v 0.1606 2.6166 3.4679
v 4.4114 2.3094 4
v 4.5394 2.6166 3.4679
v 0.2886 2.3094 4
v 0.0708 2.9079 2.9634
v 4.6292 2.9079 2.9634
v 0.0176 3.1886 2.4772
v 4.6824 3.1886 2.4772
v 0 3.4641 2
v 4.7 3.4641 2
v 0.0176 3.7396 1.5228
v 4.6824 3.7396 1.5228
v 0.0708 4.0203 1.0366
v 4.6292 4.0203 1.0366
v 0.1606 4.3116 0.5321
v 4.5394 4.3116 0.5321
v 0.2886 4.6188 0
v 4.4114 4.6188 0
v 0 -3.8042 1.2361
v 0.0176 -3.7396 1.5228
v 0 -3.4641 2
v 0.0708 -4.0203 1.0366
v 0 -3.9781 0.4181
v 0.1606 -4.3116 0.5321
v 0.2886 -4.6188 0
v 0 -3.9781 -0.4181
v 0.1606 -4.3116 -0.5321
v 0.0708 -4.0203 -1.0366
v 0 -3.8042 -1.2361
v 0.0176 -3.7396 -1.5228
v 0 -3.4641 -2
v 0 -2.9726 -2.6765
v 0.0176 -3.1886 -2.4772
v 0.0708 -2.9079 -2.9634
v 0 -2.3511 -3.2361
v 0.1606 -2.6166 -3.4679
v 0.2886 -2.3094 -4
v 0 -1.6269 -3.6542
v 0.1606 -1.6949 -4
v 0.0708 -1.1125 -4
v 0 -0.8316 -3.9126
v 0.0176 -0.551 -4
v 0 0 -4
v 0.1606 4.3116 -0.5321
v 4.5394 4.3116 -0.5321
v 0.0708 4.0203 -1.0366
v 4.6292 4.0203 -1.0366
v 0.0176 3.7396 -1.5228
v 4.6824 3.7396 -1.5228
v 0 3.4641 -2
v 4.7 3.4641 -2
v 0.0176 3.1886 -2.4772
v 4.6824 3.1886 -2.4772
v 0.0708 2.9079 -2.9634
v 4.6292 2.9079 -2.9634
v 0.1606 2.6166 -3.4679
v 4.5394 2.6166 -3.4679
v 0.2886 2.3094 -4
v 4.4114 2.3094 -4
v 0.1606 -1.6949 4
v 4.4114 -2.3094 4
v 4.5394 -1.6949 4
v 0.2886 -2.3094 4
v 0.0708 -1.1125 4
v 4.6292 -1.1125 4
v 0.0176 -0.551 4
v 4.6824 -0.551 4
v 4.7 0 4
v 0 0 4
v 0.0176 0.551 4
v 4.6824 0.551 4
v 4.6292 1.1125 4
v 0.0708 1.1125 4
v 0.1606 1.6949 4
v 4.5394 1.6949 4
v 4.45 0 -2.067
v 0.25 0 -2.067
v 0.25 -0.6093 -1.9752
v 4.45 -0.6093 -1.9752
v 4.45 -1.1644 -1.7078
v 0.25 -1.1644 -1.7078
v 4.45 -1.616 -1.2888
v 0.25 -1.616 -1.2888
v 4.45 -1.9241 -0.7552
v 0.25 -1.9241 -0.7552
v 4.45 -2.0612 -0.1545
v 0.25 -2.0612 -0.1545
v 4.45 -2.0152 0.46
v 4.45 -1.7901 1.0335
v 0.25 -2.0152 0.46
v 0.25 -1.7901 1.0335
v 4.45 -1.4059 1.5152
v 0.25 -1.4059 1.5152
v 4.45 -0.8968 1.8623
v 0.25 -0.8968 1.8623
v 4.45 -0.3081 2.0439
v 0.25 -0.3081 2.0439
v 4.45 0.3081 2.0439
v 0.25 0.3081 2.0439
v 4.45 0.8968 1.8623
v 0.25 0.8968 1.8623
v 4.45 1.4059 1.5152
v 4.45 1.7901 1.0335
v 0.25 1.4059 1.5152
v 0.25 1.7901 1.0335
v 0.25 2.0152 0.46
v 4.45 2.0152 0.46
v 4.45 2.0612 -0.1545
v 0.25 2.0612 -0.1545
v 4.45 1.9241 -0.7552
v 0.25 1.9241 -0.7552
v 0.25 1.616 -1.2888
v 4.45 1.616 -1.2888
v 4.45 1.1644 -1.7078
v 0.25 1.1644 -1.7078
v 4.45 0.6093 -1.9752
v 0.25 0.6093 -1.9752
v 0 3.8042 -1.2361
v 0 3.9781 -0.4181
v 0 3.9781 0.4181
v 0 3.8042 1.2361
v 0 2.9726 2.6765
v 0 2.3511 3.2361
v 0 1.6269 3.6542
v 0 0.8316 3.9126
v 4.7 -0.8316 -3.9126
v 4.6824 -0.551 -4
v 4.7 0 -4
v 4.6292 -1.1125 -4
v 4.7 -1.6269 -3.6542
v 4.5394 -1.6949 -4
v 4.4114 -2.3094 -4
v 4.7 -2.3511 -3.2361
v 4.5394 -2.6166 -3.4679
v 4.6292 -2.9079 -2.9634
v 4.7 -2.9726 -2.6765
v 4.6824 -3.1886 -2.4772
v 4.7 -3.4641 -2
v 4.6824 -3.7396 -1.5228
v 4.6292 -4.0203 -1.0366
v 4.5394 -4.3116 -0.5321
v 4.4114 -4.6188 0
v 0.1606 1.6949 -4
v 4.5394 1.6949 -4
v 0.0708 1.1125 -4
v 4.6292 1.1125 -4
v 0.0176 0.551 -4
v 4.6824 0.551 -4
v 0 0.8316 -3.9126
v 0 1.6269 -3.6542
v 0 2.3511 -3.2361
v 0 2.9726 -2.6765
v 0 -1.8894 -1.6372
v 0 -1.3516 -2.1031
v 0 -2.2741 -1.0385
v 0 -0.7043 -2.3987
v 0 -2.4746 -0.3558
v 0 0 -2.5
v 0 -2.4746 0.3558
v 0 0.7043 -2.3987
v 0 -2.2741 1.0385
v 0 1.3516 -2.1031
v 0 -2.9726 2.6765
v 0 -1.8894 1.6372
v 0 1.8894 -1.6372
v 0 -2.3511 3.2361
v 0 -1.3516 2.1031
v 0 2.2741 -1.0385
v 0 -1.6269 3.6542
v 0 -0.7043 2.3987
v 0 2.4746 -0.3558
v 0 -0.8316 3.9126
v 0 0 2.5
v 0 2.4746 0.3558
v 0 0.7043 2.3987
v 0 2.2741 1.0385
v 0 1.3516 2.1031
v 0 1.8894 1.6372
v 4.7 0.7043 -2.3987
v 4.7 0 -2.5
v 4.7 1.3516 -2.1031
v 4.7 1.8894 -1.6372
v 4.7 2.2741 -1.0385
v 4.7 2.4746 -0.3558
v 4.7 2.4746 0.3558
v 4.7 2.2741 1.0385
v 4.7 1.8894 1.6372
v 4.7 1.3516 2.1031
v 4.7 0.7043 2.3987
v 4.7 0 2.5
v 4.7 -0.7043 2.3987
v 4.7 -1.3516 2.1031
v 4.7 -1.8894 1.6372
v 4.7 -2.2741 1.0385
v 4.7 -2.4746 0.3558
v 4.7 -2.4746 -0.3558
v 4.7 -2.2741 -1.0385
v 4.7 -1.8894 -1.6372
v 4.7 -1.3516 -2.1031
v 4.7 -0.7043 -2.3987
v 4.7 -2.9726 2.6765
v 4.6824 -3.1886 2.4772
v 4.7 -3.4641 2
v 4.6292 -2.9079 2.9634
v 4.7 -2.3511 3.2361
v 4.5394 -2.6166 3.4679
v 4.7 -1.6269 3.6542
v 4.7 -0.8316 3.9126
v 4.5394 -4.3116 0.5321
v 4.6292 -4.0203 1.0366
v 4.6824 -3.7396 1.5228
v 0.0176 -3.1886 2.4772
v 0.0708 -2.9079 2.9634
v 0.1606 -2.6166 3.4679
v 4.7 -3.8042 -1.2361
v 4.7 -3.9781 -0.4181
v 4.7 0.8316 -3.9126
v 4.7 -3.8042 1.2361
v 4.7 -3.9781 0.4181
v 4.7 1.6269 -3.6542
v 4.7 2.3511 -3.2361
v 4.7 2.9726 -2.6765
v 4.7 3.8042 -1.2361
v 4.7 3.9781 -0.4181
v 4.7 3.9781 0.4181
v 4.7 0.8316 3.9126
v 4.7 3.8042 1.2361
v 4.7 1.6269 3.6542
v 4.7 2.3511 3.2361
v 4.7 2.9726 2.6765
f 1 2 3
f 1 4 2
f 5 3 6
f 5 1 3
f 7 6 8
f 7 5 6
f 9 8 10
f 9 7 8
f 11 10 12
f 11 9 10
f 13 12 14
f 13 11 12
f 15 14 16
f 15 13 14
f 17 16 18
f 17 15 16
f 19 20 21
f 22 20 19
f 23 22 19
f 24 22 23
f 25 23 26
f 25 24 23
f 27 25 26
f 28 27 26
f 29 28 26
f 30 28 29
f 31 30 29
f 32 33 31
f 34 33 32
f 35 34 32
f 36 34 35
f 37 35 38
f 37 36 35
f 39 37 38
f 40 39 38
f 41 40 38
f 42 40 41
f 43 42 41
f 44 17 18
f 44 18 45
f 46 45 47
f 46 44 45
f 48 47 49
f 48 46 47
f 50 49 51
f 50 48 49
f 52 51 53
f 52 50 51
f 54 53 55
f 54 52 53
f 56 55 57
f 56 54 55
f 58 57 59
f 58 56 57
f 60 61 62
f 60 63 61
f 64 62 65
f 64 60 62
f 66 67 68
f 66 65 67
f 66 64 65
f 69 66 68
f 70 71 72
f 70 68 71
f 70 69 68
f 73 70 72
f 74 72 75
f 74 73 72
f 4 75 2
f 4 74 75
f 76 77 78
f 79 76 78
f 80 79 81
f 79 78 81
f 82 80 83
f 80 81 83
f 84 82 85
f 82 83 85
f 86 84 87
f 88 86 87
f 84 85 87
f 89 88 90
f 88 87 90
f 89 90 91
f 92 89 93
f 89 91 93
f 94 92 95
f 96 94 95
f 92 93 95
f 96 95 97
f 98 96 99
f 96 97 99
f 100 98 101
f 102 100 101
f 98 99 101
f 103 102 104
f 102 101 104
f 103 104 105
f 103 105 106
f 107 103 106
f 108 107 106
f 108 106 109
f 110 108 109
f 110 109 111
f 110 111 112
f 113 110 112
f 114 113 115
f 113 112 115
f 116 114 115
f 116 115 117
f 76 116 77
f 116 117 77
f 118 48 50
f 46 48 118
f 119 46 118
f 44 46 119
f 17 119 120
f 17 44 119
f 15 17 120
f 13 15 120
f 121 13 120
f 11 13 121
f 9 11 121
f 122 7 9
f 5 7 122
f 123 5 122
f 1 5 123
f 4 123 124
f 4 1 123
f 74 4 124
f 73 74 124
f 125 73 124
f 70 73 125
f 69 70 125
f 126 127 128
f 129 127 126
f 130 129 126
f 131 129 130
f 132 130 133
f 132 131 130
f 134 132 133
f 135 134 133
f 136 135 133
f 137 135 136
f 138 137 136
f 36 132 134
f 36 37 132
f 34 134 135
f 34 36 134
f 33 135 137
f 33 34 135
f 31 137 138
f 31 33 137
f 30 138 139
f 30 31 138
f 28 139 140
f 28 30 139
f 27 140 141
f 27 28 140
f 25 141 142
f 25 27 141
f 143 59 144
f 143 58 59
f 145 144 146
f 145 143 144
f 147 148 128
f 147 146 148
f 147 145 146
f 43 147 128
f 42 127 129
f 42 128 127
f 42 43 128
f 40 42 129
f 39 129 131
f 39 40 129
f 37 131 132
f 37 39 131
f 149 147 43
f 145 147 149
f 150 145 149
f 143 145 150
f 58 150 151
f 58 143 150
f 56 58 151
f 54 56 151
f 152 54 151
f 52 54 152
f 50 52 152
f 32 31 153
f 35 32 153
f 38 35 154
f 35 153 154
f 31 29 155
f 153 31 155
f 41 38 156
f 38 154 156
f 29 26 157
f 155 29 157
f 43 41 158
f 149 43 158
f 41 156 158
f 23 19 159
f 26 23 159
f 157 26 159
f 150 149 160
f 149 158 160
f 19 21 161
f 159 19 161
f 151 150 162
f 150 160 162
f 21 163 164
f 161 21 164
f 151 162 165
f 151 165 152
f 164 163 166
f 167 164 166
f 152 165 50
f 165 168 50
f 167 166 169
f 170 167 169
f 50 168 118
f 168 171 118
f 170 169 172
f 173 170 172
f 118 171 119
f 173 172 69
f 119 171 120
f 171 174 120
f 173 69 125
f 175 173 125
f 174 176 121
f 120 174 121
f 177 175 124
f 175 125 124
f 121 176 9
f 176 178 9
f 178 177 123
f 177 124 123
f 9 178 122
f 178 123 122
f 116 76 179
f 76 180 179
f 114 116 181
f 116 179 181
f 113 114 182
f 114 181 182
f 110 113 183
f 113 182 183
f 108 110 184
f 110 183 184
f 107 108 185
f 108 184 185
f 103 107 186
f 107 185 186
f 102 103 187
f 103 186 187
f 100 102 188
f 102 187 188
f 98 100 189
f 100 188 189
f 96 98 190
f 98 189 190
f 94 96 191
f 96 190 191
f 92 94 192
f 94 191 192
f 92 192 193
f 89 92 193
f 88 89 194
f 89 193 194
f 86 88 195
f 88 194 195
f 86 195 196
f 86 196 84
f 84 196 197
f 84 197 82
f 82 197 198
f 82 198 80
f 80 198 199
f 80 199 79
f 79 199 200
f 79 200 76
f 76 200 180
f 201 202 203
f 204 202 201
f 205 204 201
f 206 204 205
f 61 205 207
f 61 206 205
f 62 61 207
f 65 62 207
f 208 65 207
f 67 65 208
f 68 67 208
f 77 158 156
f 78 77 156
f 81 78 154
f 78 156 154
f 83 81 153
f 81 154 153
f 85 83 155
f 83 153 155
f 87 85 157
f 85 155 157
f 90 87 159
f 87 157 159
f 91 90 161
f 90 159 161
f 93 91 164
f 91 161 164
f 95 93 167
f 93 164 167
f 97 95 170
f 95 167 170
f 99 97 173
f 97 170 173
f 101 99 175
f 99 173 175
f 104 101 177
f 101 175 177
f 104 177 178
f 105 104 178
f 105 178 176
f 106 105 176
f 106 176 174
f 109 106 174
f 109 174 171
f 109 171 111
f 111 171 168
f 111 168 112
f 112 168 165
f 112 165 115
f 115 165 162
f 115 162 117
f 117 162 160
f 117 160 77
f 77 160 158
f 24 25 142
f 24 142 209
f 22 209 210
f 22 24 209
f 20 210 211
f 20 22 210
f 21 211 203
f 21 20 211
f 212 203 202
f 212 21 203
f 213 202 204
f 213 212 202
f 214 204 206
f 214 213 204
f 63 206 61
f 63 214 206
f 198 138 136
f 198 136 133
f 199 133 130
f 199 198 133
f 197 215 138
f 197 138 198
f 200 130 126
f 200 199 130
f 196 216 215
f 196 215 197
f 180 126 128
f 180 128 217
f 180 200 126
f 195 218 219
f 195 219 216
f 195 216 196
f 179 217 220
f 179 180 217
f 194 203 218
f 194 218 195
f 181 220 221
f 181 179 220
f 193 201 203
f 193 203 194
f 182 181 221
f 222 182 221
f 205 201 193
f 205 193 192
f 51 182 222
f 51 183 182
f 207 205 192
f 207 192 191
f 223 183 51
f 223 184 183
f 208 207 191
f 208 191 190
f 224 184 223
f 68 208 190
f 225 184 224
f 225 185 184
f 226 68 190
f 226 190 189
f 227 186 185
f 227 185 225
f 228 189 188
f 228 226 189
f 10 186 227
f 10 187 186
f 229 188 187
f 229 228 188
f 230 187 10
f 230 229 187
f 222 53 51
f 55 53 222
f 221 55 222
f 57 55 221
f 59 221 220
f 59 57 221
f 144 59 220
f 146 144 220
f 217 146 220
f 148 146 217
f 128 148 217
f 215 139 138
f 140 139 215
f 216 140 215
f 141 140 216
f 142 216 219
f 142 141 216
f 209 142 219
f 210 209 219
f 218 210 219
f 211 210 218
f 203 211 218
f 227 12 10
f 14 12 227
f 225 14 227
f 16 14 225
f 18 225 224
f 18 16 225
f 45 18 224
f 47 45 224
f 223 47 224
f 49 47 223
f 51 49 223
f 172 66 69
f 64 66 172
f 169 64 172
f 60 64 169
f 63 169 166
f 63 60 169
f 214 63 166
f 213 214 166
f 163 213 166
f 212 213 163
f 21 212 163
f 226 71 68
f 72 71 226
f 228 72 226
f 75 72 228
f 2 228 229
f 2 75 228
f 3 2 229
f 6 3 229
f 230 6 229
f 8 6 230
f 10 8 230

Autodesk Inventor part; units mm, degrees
ref_plane "YZ Plane" through (0, 0, 0) normal (1, 0, 0) x (0, 1, 0)
ref_plane "XZ Plane" through (0, 0, 0) normal (0, 1, 0) x (-1, 0, 0)
sketch "Sketch1" plane through (0, 0, 0) normal (1, 0, 0) x (0, 1, 0)
  line L0 (-4.6188, 0) -> (-2.3094, 4)
  line L1 (-2.3094, 4) -> (2.3094, 4)
  line L2 (2.3094, 4) -> (4.6188, 0)
  line L3 (4.6188, 0) -> (2.3094, -4)
  line L4 (2.3094, -4) -> (-2.3094, -4)
  line L5 (-2.3094, -4) -> (-4.6188, 0)
  point P0 (0, 0)
  point P1 (0, 0)
  dimension "d0" = 9.2376
extrude "Body" add sketch "Sketch1" along normal blind 4.7
sketch "Sketch2" plane through (0, 0, 0) normal (0, 0, 1) x (1, 0, 0)
  line L0 (0, 2.3094) -> (0, 4.6188) projected
  line L1 (0, 4.6188) -> (4.7, 4.6188) projected
  line L2 (4.7, 2.3094) -> (4.7, 4.6188) projected
  line L3 (-0.94, 0) -> (5.64, 0) projected
  line L4 (0.2886, 4.6188) -> (0, 4)
  line L5 (4.4114, 4.6188) -> (4.7, 4)
  dimension "d3" = 25
  dimension "d4" = 25
  dimension "d5" = 8
  dimension "d6" = 8
revolve "Chamfer1" cut sketch "Sketch2" angle 360 about axis through (-10, 0, 0) along (1, 0, 0)
sketch "Sketch3" plane through (4.7, 0, 0) normal (1, 0, 0) x (0, 0, -1)
  arc A0 (-2, -3.4641) -> (2, -3.4641) centre (0, 0) ccw projected
hole "Thread" at (4.7, 0, 0) direction (-1, 0, 0) diameter 4.134 end through all thread size "M5x0.8" class "6H" standard "ANSI Metric M Profile"
chamfer "Chamfer2" distance 0.433 angle 30 1 edges at (4.7, 0, 2.067) measured on face at (4.7, 3.336, -0.083)
chamfer "Chamfer3" distance 0.433 angle 30 1 edges at (0, 0, 2.067) measured on face at (0, 3.336, -0.083)
ref_plane "Work Plane1" through (-8.3929, 0, 0) normal (0, -0.866, -0.5) x (1, 0, 0)
equation "\"d0\" = 1.1547 * SW"
equation "\"d1\" = KOH"
equation "\"d3\" = ANG1"
equation "\"d4\" = ANG2"
equation "\"d5\" = SW0"
equation "\"d6\" = SW01"
equation "\"d8\" = -0.5 * GD1 + 0.5 * NND"
equation "\"d40\" = -0.5 * GD1 + 0.5 * NND"
equation "\"d10\" = -0.5 * GD1 + 0.5 * NND"
equation "\"d41\" = -0.5 * GD1 + 0.5 * NND"
equation "\"ANG1\" = 25deg"
equation "\"ANG2\" = 25deg"
equation "\"NND\" = 5"
equation "\"KOH\" = 4.7"
equation "\"SW\" = 8"
equation "\"SW0\" = SW"
equation "\"SW01\" = SW"
equation "\"GUL\" = 0.541266 * PTC"
equation "\"THREADDIA\" = 5"
equation "\"TOA\" = 30deg"
equation "\"PTC\" = 0.8"
equation "\"E0\" = 1.155 * SW"
equation "\"GAL\" = 0.541266 * PTC"
equation "\"SD2\" = 0"
equation "\"WFT\" = 0"
equation "\"GD1\" = 4.133975"
properties part number "ANSI B 18.2.4.1 M - M5 x 0.8" material "Steel, Mild"
